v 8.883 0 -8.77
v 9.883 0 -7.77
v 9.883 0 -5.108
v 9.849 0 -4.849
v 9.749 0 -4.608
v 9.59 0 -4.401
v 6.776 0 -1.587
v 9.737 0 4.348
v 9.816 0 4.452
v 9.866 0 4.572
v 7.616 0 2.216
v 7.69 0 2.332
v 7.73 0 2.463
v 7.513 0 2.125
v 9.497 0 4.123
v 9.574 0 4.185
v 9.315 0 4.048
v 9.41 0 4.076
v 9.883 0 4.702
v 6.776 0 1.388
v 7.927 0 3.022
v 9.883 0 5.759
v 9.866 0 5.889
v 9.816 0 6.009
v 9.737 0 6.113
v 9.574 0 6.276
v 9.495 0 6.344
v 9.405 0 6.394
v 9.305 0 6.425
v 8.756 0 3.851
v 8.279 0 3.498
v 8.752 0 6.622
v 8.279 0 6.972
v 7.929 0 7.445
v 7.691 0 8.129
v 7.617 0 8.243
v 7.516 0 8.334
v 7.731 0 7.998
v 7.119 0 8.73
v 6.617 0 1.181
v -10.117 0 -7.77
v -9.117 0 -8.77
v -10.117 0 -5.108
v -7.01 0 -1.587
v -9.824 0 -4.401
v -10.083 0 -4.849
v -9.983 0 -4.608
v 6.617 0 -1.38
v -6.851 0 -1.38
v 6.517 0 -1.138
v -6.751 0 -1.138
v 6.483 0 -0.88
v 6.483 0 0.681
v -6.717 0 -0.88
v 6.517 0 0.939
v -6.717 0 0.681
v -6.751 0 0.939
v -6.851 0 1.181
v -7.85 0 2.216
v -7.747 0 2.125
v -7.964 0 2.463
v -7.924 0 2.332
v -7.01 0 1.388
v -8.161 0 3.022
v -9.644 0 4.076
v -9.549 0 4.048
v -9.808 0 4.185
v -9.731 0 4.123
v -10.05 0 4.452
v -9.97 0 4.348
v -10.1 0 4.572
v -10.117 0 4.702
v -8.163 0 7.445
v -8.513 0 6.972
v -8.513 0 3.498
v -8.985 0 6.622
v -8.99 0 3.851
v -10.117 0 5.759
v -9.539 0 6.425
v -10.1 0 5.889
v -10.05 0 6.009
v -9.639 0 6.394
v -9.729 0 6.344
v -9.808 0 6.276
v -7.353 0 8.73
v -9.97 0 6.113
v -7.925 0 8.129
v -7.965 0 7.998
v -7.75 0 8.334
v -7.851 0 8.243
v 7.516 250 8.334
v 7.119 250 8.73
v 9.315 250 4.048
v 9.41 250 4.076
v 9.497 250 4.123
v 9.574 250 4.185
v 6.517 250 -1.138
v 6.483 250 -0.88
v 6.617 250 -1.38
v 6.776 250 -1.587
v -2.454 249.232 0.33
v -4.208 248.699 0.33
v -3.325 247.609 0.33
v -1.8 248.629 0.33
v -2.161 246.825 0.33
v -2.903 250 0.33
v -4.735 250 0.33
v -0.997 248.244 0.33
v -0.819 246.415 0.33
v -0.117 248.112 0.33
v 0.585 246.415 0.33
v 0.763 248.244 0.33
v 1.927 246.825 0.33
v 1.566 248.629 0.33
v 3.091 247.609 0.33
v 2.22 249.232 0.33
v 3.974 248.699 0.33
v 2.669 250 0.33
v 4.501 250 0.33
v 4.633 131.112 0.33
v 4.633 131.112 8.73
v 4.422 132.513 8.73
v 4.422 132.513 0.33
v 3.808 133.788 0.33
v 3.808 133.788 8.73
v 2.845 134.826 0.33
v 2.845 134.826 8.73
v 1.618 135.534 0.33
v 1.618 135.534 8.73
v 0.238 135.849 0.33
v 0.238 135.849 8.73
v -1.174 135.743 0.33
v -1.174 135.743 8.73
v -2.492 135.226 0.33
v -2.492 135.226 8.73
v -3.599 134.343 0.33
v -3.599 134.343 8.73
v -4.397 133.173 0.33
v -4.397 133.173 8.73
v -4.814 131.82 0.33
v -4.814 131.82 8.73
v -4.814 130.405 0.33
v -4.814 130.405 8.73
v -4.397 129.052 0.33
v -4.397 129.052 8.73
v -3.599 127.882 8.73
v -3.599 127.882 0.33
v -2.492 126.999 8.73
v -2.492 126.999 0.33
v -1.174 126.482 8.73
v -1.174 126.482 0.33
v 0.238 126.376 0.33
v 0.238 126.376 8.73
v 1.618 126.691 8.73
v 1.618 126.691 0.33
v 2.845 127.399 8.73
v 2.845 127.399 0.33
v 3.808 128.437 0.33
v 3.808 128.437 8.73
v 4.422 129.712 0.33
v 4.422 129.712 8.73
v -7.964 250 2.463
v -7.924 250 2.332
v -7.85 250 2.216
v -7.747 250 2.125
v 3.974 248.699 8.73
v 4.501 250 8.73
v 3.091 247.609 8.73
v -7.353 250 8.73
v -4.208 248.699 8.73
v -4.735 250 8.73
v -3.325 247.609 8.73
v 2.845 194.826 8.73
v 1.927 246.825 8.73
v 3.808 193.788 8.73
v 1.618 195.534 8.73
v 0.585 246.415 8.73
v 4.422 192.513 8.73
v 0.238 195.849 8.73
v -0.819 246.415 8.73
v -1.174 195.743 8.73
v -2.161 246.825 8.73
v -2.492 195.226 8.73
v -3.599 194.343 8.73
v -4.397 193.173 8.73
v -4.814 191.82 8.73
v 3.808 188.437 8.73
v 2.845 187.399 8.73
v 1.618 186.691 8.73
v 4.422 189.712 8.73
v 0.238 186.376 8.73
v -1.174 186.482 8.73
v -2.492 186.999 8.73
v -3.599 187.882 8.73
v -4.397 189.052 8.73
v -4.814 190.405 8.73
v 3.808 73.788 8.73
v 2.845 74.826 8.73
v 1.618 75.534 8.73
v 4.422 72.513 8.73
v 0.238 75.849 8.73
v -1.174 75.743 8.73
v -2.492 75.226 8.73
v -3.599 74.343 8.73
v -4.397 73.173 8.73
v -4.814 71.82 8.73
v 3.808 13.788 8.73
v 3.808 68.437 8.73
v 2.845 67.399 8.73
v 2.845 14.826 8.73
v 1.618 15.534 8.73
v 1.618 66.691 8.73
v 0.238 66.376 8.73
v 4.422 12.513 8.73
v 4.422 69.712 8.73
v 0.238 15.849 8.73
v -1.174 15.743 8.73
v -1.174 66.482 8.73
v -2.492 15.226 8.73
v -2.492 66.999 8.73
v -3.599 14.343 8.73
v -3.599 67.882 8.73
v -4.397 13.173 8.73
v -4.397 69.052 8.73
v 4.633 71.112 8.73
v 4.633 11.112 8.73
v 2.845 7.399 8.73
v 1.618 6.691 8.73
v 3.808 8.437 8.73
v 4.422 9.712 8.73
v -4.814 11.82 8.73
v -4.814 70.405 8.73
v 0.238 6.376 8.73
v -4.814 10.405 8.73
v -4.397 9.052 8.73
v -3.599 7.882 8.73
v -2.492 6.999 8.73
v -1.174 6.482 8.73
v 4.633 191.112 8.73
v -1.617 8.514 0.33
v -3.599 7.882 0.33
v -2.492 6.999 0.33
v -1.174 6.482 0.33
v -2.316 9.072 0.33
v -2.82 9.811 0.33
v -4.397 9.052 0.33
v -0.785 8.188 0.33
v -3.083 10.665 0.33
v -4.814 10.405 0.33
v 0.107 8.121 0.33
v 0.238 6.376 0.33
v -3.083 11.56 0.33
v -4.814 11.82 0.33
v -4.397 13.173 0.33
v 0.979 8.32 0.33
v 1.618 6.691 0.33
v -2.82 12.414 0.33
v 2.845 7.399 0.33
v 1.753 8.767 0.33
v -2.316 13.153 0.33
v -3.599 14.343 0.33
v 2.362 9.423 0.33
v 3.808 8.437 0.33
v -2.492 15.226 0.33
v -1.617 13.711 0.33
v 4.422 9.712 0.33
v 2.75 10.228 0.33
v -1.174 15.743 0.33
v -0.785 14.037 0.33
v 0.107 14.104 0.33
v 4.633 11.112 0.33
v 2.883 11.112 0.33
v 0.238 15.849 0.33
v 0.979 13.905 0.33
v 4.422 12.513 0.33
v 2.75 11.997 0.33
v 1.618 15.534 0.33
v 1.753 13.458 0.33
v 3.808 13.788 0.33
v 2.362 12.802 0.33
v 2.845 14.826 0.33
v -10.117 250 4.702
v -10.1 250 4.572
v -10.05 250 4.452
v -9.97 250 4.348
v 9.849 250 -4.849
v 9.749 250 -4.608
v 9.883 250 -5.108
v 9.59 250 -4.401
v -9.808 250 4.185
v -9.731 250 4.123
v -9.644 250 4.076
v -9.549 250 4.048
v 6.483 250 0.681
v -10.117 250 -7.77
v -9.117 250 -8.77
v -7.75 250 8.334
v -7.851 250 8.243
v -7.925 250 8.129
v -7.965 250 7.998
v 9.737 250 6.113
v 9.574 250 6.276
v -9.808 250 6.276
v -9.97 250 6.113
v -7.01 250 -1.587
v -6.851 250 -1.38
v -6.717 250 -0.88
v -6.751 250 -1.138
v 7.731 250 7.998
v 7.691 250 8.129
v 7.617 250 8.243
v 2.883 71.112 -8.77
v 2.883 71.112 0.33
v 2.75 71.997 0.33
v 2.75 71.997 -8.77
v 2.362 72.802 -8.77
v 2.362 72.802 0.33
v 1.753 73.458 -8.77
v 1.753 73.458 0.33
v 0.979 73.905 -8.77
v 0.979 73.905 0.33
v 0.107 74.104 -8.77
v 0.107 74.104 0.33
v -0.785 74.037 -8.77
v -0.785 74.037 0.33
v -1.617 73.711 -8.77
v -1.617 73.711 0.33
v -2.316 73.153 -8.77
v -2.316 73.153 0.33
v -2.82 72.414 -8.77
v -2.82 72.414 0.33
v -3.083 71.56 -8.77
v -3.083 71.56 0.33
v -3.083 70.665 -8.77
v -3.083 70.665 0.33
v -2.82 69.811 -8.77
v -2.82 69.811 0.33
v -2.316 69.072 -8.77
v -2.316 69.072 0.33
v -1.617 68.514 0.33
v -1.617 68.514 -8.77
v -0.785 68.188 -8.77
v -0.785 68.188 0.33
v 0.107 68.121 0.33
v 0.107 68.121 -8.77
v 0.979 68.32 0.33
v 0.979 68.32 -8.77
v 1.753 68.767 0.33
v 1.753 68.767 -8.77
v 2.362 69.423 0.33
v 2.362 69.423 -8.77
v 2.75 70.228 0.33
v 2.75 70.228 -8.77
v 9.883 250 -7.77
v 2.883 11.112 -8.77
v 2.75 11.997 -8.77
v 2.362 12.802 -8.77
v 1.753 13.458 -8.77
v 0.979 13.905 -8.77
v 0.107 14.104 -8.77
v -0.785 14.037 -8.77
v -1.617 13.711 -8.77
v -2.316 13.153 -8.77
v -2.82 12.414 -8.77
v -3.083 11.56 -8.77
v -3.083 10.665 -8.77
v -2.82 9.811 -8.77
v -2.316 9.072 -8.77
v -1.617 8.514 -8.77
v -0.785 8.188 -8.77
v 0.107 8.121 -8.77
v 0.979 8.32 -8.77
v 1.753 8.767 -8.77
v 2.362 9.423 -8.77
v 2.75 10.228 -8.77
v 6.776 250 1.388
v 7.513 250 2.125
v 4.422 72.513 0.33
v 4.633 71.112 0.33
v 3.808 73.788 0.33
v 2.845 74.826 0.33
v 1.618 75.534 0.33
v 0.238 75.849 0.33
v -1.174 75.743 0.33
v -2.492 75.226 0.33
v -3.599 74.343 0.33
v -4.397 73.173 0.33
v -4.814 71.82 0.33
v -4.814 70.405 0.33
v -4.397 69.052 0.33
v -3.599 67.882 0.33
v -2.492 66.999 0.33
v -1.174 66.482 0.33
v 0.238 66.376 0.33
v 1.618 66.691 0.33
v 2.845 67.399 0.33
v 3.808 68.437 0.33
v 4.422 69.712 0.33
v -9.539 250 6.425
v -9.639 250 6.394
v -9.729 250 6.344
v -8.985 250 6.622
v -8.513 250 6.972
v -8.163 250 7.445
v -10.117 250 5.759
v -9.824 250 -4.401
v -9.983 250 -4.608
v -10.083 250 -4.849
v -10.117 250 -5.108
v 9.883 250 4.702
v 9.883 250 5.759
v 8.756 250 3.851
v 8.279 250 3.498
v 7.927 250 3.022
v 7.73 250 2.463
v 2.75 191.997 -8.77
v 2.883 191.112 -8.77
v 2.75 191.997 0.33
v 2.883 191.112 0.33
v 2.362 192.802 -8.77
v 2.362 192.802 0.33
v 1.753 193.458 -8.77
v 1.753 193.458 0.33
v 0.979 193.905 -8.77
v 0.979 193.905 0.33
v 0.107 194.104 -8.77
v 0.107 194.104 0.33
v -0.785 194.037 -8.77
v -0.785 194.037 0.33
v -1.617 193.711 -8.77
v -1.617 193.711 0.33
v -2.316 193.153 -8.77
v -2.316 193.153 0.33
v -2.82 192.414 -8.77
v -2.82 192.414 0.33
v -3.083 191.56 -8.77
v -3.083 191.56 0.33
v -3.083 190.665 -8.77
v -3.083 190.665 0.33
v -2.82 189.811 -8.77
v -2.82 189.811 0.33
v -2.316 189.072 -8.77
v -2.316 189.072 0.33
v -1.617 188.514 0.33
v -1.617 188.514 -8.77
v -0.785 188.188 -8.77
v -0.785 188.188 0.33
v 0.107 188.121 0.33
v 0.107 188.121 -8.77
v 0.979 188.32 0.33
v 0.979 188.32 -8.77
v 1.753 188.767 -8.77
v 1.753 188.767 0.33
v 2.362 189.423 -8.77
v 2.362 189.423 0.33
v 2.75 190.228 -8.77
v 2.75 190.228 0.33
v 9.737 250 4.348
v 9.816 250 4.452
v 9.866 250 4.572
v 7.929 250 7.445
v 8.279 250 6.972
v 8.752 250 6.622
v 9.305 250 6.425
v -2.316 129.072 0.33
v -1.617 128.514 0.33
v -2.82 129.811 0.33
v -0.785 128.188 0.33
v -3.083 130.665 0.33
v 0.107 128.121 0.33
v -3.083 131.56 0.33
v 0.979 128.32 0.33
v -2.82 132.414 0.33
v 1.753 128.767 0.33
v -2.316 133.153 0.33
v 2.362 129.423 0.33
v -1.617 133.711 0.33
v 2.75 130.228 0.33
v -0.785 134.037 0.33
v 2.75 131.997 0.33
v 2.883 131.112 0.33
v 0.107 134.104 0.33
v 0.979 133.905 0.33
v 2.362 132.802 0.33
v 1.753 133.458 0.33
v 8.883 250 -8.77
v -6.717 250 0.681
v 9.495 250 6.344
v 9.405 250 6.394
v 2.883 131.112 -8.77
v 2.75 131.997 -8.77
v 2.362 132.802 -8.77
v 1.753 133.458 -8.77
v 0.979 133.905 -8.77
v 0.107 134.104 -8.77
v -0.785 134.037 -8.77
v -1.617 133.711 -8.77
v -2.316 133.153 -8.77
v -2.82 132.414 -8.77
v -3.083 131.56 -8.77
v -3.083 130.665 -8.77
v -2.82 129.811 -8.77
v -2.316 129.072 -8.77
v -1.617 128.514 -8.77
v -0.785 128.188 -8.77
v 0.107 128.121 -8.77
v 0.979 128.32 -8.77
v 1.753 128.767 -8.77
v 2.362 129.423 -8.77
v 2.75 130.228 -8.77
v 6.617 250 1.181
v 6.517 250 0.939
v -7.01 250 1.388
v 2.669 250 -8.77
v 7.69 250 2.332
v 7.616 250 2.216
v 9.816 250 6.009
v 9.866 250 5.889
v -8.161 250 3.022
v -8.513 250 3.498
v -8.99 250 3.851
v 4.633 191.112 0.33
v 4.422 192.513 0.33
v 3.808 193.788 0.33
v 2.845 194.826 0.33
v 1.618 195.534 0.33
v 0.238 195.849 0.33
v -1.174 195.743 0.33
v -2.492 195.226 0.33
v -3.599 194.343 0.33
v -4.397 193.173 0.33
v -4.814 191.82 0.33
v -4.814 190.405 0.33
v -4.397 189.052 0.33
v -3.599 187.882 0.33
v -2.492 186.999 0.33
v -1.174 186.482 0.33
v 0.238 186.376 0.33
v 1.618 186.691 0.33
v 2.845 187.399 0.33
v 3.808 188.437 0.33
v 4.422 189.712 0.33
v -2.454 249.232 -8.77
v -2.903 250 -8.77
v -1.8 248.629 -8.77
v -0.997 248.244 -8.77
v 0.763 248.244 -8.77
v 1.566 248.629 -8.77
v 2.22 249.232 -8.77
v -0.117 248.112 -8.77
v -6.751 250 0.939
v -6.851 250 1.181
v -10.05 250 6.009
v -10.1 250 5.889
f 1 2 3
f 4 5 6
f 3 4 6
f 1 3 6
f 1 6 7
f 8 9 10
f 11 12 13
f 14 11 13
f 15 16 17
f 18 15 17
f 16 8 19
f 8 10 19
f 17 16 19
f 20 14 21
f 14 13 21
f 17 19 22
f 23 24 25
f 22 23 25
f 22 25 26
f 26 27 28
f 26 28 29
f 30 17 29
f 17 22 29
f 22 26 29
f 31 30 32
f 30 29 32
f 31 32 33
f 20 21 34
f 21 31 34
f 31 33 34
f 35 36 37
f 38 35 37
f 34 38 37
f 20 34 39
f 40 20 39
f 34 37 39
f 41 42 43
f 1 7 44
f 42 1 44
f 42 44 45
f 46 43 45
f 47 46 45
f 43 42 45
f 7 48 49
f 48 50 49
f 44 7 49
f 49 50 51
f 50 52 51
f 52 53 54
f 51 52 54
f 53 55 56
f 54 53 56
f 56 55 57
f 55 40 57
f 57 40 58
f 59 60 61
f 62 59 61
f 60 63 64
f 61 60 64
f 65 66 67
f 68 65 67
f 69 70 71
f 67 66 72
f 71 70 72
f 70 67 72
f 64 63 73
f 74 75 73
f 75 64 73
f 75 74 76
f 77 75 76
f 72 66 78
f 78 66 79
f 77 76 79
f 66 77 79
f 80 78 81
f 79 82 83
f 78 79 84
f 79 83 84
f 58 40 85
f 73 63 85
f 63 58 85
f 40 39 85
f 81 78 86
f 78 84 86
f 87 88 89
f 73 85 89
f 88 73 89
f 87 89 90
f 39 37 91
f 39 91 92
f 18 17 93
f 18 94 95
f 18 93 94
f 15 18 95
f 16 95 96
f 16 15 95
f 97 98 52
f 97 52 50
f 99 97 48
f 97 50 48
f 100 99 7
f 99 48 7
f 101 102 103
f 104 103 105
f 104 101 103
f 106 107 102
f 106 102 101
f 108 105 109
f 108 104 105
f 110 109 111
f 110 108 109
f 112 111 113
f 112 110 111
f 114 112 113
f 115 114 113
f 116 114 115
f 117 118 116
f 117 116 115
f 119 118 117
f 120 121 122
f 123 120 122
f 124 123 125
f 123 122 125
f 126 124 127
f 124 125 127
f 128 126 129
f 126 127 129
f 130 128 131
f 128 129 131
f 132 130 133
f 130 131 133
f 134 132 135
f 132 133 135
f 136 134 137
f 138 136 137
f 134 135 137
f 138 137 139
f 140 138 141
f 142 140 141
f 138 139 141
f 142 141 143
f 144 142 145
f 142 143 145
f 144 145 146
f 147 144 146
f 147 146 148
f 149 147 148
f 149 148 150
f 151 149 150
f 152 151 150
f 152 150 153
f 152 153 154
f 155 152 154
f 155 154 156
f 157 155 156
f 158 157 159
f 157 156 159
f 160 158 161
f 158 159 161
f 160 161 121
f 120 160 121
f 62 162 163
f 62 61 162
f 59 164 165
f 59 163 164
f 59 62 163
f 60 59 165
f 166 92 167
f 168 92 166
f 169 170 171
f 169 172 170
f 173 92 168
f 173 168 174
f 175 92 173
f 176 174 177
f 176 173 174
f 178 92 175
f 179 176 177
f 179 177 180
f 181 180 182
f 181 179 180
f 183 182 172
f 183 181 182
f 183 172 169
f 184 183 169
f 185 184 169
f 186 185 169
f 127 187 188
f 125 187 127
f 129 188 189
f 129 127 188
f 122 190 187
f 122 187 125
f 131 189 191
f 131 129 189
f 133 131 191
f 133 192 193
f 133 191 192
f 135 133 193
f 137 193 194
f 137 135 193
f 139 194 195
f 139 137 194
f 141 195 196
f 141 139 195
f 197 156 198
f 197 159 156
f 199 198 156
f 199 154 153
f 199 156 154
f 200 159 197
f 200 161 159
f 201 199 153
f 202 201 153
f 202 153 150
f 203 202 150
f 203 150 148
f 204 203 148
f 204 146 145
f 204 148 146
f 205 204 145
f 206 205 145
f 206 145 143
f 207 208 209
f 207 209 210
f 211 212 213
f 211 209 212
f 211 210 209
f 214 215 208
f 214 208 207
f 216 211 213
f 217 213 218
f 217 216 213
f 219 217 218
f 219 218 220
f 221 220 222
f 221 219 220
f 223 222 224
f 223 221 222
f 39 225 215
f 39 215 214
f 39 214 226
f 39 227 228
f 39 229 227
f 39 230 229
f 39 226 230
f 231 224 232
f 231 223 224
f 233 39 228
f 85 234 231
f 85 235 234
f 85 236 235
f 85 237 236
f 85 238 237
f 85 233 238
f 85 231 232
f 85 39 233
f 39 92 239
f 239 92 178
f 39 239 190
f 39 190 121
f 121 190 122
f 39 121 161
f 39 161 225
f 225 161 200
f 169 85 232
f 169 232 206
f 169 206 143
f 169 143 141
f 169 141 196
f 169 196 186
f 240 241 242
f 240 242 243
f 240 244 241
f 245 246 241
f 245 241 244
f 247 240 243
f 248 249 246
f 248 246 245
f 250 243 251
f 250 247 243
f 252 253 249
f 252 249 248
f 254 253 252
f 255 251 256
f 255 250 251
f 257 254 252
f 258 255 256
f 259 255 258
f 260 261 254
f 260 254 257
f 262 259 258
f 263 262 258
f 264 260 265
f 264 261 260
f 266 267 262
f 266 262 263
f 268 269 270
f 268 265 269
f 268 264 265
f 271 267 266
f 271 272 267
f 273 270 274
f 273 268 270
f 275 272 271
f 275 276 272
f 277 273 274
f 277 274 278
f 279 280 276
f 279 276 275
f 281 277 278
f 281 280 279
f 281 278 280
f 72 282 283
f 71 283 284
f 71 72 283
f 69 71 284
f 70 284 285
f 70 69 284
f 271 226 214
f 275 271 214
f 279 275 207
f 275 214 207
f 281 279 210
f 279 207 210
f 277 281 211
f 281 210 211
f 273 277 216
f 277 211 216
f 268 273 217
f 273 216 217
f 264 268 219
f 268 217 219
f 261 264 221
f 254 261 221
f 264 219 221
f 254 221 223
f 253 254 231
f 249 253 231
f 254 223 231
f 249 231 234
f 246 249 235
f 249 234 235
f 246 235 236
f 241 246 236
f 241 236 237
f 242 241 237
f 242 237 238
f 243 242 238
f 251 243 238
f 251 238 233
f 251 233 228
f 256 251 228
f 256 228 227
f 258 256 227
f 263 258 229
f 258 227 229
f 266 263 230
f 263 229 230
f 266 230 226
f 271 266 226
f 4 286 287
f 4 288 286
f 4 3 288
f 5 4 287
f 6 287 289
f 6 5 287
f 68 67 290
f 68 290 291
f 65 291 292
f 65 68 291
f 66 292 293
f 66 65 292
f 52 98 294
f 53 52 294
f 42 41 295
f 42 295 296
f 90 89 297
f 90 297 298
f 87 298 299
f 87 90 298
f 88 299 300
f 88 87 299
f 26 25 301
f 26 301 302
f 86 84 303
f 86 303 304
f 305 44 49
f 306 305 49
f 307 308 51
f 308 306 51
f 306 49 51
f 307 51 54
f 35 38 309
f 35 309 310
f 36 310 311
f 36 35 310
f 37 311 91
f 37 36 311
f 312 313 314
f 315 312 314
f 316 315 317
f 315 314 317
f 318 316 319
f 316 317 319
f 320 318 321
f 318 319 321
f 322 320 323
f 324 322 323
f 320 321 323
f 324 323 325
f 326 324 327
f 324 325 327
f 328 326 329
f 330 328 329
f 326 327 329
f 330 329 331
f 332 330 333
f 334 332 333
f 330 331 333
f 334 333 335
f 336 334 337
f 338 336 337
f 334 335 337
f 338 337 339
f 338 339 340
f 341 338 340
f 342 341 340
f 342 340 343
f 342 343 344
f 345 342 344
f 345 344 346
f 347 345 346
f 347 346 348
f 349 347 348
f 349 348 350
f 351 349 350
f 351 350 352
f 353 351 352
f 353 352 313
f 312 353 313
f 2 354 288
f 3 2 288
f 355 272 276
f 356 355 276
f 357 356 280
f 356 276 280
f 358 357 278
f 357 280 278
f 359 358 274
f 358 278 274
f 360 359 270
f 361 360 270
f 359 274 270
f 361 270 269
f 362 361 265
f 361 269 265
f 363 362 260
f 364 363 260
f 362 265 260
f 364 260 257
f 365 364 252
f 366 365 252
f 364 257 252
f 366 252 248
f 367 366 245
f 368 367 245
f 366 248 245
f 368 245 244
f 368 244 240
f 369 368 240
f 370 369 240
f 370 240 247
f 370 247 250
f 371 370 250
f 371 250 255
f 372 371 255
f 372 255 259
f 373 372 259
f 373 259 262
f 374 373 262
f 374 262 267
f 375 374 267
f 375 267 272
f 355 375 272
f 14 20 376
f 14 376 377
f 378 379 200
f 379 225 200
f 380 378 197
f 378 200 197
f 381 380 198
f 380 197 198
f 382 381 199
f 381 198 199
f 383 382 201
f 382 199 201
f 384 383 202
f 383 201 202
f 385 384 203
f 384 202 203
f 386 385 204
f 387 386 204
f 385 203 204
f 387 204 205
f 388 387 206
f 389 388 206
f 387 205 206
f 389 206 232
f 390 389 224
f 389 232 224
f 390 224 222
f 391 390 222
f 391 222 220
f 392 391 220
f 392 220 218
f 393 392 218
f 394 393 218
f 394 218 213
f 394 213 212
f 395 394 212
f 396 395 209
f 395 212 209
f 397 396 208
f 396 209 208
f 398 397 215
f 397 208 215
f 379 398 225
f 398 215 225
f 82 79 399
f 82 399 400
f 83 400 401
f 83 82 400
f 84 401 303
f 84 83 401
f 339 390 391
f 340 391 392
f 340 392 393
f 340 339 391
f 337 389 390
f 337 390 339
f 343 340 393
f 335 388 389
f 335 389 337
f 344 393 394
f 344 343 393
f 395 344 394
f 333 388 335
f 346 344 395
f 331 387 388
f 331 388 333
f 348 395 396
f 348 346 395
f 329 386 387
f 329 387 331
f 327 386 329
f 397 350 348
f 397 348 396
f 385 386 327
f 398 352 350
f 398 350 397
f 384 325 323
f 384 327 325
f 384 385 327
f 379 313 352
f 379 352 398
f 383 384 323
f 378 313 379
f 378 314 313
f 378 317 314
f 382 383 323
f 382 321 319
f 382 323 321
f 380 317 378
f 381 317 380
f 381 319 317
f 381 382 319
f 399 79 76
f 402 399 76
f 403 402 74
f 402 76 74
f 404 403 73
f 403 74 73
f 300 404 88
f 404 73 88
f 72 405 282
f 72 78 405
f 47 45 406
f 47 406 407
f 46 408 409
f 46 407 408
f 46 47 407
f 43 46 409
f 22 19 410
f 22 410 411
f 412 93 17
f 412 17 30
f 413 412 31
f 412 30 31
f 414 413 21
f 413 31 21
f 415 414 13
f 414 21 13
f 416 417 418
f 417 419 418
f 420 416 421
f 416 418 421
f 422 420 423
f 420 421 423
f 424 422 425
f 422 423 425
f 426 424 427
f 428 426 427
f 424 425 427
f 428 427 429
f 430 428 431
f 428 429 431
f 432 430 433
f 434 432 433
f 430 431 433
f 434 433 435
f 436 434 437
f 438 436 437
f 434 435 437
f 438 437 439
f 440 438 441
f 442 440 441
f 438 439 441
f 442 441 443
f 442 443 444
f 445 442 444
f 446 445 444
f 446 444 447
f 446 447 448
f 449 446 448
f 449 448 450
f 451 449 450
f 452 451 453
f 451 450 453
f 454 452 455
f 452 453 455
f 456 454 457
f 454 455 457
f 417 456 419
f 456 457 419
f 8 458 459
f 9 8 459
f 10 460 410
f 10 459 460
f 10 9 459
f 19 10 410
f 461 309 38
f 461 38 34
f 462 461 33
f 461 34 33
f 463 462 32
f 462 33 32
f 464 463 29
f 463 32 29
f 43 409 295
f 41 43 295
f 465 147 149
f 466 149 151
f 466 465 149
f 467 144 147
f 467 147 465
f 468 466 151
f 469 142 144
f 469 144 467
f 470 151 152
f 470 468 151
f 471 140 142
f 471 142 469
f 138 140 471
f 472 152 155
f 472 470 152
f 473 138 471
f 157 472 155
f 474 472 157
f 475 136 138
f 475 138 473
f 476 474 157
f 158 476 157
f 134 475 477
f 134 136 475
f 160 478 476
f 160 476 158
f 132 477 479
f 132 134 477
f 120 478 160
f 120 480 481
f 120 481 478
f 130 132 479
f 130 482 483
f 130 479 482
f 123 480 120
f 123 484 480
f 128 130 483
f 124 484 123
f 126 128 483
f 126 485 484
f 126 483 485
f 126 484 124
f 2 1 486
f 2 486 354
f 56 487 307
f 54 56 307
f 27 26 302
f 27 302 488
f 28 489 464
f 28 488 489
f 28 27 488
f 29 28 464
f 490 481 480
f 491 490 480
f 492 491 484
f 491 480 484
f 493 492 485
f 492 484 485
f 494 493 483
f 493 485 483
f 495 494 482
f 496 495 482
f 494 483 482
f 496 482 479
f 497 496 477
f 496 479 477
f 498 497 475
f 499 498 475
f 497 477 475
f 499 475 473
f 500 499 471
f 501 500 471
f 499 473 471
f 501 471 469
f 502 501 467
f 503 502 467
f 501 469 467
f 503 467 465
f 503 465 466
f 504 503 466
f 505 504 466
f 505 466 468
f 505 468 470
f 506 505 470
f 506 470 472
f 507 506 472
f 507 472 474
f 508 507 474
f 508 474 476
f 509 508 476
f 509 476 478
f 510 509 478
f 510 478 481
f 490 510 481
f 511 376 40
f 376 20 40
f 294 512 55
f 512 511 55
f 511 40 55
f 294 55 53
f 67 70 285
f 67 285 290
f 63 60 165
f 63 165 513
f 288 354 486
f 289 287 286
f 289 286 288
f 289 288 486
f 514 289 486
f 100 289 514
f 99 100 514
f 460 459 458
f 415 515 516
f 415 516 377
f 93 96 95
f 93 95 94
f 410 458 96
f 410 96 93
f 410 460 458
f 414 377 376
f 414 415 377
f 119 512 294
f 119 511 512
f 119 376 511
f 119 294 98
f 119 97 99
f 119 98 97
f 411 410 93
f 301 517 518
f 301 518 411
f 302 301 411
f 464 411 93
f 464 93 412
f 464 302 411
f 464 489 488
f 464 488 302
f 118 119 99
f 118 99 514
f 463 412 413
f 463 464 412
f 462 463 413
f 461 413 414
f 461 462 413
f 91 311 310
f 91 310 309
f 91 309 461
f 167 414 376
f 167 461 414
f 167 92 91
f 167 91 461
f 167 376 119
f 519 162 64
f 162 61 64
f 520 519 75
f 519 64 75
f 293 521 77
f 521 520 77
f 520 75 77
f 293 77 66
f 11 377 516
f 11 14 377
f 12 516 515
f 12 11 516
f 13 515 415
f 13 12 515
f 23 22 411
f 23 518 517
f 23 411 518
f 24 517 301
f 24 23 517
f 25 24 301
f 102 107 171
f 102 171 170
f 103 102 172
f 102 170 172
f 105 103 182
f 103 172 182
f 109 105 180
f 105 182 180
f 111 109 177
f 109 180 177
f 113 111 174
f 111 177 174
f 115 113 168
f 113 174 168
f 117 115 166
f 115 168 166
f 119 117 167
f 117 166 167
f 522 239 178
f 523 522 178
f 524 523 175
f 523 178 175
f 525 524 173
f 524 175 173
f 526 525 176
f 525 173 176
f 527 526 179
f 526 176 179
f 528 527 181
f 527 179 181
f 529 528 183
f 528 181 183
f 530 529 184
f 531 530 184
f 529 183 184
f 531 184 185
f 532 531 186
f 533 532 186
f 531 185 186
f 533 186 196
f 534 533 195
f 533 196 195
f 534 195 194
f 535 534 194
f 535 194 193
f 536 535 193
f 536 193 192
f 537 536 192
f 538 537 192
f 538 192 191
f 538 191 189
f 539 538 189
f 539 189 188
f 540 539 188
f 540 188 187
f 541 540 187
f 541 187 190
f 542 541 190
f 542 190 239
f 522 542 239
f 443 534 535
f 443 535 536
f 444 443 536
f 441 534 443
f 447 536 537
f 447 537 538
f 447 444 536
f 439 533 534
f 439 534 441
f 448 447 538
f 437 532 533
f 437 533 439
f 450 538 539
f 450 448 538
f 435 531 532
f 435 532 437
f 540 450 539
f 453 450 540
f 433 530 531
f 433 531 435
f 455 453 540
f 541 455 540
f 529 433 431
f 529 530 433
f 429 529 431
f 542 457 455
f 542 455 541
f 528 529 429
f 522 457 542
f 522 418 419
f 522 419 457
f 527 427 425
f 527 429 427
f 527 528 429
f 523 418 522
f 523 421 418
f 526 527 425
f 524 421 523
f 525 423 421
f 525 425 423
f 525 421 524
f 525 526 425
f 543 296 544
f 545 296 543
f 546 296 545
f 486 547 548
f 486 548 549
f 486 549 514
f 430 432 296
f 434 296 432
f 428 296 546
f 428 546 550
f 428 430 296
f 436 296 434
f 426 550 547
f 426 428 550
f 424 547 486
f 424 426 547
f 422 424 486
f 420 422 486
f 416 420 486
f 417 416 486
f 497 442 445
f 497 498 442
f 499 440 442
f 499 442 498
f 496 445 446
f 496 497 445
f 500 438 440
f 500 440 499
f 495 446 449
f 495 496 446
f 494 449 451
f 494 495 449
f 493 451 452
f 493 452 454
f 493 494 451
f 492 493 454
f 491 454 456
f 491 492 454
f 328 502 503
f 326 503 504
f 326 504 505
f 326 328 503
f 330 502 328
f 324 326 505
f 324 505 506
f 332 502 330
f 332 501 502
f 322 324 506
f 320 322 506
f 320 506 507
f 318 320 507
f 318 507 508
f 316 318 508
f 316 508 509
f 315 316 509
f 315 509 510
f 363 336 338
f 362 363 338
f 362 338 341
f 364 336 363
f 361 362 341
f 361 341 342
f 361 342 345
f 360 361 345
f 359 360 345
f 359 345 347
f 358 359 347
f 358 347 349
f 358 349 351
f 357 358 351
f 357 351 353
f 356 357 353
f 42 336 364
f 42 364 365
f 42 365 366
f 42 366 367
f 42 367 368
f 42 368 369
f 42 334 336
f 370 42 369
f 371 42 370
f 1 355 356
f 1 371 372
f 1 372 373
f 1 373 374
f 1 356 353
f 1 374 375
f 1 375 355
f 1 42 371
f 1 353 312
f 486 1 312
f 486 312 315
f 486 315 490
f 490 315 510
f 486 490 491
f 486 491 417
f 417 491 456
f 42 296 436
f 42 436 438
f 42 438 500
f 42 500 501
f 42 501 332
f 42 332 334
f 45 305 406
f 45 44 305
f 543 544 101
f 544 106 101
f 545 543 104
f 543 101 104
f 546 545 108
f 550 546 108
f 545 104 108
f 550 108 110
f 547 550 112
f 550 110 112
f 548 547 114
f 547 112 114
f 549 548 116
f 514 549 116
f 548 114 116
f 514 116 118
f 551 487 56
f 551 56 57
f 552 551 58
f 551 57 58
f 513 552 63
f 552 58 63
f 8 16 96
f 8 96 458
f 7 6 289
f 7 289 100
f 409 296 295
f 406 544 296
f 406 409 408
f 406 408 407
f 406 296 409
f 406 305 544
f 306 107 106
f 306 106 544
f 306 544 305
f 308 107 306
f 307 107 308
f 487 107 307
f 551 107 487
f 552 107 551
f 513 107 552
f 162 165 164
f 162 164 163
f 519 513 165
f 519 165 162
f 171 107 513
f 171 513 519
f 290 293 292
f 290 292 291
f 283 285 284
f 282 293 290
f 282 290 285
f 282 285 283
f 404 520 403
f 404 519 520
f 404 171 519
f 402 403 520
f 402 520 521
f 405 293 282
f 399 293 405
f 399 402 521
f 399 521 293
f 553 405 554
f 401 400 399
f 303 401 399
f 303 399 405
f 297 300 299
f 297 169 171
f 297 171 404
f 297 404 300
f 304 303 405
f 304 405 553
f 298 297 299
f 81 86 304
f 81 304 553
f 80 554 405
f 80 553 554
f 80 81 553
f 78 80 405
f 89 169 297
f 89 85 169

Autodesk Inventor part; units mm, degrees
ref_plane "YZ Plane" through (0, 0, 0) normal (1, 0, 0) x (0, 1, 0)
ref_plane "XZ Plane" through (0, 0, 0) normal (0, 1, 0) x (-1, 0, 0)
ref_plane "XY Plane" through (0, 0, 0) normal (0, 0, 1) x (1, 0, 0)
sketch "Sketch1" plane through (0, 0, 0) normal (0, 1, 0) x (-1, 0, 0)
  arc A0 (-6.7759, -1.5867) -> (-6.483, -0.8796) centre (-7.483, -0.8796) ccw
  line L0 (-7.1187, 8.7305) -> (7.3527, 8.7305)
  line L1 (9.117, -8.7695) -> (-8.883, -8.7695)
  line L2 (6.717, 0.6806) -> (6.717, -0.8796)
  arc A1 (7.0099, 1.3877) -> (6.717, 0.6806) centre (7.717, 0.6806) ccw
  line L3 (7.7471, 2.1249) -> (7.0099, 1.3877)
  arc A2 (6.717, -0.8796) -> (7.0099, -1.5867) centre (7.717, -0.8796) ccw
  arc A3 (-9.5901, -4.4009) -> (-9.883, -5.108) centre (-8.883, -5.108) ccw
  line L4 (-9.883, -7.7695) -> (-9.883, -5.108)
  line L5 (-8.883, -8.7695) -> (-9.883, -7.7695)
  line L6 (-9.5901, -4.4009) -> (-6.7759, -1.5867)
  line L7 (10.117, 5.7591) -> (10.117, 4.7019)
  arc A4 (10.117, 5.7591) -> (9.9705, 6.1127) centre (9.617, 5.7591) ccw
  line L8 (9.8076, 6.2756) -> (9.9705, 6.1127)
  arc A5 (9.8076, 6.2756) -> (9.5394, 6.4246) centre (9.4424, 5.9341) ccw
  arc A6 (7.9651, 7.9985) -> (9.5394, 6.4246) centre (9.9271, 8.3866) ccw
  arc A7 (7.9651, 7.9985) -> (7.7495, 8.3337) centre (7.4717, 7.918) ccw
  line L9 (7.3527, 8.7305) -> (7.7495, 8.3337)
  line L10 (-6.483, -0.8796) -> (-6.483, 0.6806)
  arc A8 (-6.483, 0.6806) -> (-6.7759, 1.3877) centre (-7.483, 0.6806) ccw
  line L11 (-6.7759, 1.3877) -> (-7.5132, 2.1249)
  arc A9 (-7.7298, 2.463) -> (-7.5132, 2.1249) centre (-7.2359, 2.541) ccw
  arc A10 (-7.7298, 2.463) -> (-9.3148, 4.048) centre (-9.6936, 2.0842) ccw
  line L12 (-9.5736, 4.1854) -> (-9.7366, 4.3483)
  arc A11 (-9.883, 4.7019) -> (-9.7366, 4.3483) centre (-9.383, 4.7019) ccw
  line L13 (-9.883, 4.7019) -> (-9.883, 5.7591)
  arc A12 (-9.7366, 6.1127) -> (-9.883, 5.7591) centre (-9.383, 5.7591) ccw
  arc A13 (9.9705, 4.3483) -> (10.117, 4.7019) centre (9.617, 4.7019) ccw
  line L14 (9.9705, 4.3483) -> (9.8076, 4.1854)
  arc A14 (9.5488, 4.048) -> (9.8076, 4.1854) centre (9.4541, 4.539) ccw
  arc A15 (9.5488, 4.048) -> (7.9638, 2.463) centre (9.9276, 2.0842) ccw
  arc A16 (7.7471, 2.1249) -> (7.9638, 2.463) centre (7.4699, 2.541) ccw
  line L15 (7.0099, -1.5867) -> (9.8241, -4.4009)
  arc A17 (10.117, -5.108) -> (9.8241, -4.4009) centre (9.117, -5.108) ccw
  line L16 (10.117, -5.108) -> (10.117, -7.7695)
  line L17 (10.117, -7.7695) -> (9.117, -8.7695)
  line L18 (-9.7366, 6.1127) -> (-9.5736, 6.2756)
  arc A18 (-9.3054, 6.4246) -> (-9.5736, 6.2756) centre (-9.2085, 5.9341) ccw
  arc A19 (-9.3054, 6.4246) -> (-7.7312, 7.9985) centre (-9.6932, 8.3866) ccw
  arc A20 (-7.5156, 8.3337) -> (-7.7312, 7.9985) centre (-7.2377, 7.918) ccw
  line L19 (-7.5156, 8.3337) -> (-7.1187, 8.7305)
  arc A21 (-9.5736, 4.1854) -> (-9.3148, 4.048) centre (-9.2201, 4.539) ccw
  point P0 (0, 0)
  point P1 (0.117, -0.039)
  point P2 (0.117, 5.2305)
extrude "Extrusion1" add sketch "Sketch1" along normal blind 250
sketch "Sketch2" plane through (-7.3527, 0, 8.7305) normal (0, 0, 1) x (1, 0, 0)
  circle A0 centre (7.2357, 11.1125) radius 3
  line L0 (0, 0) -> (14.4714, 0) projected
  line L1 (-2.7643, 0) -> (-2.7643, 250) projected
  line L2 (17.2357, 0) -> (17.2357, 250) projected
  circle A1 centre (7.2357, 71.1125) radius 3
  circle A2 centre (7.2357, 131.1125) radius 3
  circle A3 centre (7.2357, 191.1125) radius 3
  circle A4 centre (7.2357, 251.1125) radius 3
  point P0 (7.3527, 0)
  dimension "d2" = 6
  dimension "d3" = 11.1125
  dimension "d4" = 20
  dimension "d5" = 10
  dimension "d8" = 60
  dimension "d18" = 60
extrude "Extrusion2" cut sketch "Sketch2" against normal through all contours A0 | A1 | A2 | A3
sketch "Sketch3" plane through (-7.3527, 0, 8.7305) normal (0, 0, 1) x (1, 0, 0)
  circle A0 centre (7.2357, 71.1125) radius 3 projected
  circle A1 centre (7.2357, 131.1125) radius 3 projected
  circle A2 centre (7.2357, 11.1125) radius 3 projected
  circle A3 centre (7.2357, 191.1125) radius 3 projected
  line L0 (0, 0) -> (14.4714, 0) projected
  line L1 (14.4714, 0) -> (14.4714, 250) projected
  line L2 (0, 250) -> (14.4714, 250) projected
  line L3 (0, 0) -> (0, 250) projected
  circle A4 centre (7.2357, 11.1125) radius 4.75
  circle A5 centre (7.2357, 71.1125) radius 4.75
  circle A6 centre (7.2357, 131.1125) radius 4.75
  circle A7 centre (7.2357, 191.1125) radius 4.75
  circle A8 centre (7.2357, 251.1125) radius 4.75
  point P0 (7.3527, 0)
  point P1 (11.8536, 250)
  point P2 (2.6178, 250)
  dimension "d15" = 9.5
  dimension "d21" = 60
extrude "Extrusion3" cut sketch "Sketch3" against normal blind 8.4 contours A4 | A5 | A6 | A7
extrude "Extrusion4" cut sketch "Sketch2" against normal through all contours A4
extrude "Extrusion5" cut sketch "Sketch3" against normal up to surface (8.4 mm away) contours L2 A8 picked at (8.3547, 248.0358)
equation "\"d5\" = 0.5 * d4"
properties part number "HGR20R-LinearRail200mm" material "Stainless Steel"
